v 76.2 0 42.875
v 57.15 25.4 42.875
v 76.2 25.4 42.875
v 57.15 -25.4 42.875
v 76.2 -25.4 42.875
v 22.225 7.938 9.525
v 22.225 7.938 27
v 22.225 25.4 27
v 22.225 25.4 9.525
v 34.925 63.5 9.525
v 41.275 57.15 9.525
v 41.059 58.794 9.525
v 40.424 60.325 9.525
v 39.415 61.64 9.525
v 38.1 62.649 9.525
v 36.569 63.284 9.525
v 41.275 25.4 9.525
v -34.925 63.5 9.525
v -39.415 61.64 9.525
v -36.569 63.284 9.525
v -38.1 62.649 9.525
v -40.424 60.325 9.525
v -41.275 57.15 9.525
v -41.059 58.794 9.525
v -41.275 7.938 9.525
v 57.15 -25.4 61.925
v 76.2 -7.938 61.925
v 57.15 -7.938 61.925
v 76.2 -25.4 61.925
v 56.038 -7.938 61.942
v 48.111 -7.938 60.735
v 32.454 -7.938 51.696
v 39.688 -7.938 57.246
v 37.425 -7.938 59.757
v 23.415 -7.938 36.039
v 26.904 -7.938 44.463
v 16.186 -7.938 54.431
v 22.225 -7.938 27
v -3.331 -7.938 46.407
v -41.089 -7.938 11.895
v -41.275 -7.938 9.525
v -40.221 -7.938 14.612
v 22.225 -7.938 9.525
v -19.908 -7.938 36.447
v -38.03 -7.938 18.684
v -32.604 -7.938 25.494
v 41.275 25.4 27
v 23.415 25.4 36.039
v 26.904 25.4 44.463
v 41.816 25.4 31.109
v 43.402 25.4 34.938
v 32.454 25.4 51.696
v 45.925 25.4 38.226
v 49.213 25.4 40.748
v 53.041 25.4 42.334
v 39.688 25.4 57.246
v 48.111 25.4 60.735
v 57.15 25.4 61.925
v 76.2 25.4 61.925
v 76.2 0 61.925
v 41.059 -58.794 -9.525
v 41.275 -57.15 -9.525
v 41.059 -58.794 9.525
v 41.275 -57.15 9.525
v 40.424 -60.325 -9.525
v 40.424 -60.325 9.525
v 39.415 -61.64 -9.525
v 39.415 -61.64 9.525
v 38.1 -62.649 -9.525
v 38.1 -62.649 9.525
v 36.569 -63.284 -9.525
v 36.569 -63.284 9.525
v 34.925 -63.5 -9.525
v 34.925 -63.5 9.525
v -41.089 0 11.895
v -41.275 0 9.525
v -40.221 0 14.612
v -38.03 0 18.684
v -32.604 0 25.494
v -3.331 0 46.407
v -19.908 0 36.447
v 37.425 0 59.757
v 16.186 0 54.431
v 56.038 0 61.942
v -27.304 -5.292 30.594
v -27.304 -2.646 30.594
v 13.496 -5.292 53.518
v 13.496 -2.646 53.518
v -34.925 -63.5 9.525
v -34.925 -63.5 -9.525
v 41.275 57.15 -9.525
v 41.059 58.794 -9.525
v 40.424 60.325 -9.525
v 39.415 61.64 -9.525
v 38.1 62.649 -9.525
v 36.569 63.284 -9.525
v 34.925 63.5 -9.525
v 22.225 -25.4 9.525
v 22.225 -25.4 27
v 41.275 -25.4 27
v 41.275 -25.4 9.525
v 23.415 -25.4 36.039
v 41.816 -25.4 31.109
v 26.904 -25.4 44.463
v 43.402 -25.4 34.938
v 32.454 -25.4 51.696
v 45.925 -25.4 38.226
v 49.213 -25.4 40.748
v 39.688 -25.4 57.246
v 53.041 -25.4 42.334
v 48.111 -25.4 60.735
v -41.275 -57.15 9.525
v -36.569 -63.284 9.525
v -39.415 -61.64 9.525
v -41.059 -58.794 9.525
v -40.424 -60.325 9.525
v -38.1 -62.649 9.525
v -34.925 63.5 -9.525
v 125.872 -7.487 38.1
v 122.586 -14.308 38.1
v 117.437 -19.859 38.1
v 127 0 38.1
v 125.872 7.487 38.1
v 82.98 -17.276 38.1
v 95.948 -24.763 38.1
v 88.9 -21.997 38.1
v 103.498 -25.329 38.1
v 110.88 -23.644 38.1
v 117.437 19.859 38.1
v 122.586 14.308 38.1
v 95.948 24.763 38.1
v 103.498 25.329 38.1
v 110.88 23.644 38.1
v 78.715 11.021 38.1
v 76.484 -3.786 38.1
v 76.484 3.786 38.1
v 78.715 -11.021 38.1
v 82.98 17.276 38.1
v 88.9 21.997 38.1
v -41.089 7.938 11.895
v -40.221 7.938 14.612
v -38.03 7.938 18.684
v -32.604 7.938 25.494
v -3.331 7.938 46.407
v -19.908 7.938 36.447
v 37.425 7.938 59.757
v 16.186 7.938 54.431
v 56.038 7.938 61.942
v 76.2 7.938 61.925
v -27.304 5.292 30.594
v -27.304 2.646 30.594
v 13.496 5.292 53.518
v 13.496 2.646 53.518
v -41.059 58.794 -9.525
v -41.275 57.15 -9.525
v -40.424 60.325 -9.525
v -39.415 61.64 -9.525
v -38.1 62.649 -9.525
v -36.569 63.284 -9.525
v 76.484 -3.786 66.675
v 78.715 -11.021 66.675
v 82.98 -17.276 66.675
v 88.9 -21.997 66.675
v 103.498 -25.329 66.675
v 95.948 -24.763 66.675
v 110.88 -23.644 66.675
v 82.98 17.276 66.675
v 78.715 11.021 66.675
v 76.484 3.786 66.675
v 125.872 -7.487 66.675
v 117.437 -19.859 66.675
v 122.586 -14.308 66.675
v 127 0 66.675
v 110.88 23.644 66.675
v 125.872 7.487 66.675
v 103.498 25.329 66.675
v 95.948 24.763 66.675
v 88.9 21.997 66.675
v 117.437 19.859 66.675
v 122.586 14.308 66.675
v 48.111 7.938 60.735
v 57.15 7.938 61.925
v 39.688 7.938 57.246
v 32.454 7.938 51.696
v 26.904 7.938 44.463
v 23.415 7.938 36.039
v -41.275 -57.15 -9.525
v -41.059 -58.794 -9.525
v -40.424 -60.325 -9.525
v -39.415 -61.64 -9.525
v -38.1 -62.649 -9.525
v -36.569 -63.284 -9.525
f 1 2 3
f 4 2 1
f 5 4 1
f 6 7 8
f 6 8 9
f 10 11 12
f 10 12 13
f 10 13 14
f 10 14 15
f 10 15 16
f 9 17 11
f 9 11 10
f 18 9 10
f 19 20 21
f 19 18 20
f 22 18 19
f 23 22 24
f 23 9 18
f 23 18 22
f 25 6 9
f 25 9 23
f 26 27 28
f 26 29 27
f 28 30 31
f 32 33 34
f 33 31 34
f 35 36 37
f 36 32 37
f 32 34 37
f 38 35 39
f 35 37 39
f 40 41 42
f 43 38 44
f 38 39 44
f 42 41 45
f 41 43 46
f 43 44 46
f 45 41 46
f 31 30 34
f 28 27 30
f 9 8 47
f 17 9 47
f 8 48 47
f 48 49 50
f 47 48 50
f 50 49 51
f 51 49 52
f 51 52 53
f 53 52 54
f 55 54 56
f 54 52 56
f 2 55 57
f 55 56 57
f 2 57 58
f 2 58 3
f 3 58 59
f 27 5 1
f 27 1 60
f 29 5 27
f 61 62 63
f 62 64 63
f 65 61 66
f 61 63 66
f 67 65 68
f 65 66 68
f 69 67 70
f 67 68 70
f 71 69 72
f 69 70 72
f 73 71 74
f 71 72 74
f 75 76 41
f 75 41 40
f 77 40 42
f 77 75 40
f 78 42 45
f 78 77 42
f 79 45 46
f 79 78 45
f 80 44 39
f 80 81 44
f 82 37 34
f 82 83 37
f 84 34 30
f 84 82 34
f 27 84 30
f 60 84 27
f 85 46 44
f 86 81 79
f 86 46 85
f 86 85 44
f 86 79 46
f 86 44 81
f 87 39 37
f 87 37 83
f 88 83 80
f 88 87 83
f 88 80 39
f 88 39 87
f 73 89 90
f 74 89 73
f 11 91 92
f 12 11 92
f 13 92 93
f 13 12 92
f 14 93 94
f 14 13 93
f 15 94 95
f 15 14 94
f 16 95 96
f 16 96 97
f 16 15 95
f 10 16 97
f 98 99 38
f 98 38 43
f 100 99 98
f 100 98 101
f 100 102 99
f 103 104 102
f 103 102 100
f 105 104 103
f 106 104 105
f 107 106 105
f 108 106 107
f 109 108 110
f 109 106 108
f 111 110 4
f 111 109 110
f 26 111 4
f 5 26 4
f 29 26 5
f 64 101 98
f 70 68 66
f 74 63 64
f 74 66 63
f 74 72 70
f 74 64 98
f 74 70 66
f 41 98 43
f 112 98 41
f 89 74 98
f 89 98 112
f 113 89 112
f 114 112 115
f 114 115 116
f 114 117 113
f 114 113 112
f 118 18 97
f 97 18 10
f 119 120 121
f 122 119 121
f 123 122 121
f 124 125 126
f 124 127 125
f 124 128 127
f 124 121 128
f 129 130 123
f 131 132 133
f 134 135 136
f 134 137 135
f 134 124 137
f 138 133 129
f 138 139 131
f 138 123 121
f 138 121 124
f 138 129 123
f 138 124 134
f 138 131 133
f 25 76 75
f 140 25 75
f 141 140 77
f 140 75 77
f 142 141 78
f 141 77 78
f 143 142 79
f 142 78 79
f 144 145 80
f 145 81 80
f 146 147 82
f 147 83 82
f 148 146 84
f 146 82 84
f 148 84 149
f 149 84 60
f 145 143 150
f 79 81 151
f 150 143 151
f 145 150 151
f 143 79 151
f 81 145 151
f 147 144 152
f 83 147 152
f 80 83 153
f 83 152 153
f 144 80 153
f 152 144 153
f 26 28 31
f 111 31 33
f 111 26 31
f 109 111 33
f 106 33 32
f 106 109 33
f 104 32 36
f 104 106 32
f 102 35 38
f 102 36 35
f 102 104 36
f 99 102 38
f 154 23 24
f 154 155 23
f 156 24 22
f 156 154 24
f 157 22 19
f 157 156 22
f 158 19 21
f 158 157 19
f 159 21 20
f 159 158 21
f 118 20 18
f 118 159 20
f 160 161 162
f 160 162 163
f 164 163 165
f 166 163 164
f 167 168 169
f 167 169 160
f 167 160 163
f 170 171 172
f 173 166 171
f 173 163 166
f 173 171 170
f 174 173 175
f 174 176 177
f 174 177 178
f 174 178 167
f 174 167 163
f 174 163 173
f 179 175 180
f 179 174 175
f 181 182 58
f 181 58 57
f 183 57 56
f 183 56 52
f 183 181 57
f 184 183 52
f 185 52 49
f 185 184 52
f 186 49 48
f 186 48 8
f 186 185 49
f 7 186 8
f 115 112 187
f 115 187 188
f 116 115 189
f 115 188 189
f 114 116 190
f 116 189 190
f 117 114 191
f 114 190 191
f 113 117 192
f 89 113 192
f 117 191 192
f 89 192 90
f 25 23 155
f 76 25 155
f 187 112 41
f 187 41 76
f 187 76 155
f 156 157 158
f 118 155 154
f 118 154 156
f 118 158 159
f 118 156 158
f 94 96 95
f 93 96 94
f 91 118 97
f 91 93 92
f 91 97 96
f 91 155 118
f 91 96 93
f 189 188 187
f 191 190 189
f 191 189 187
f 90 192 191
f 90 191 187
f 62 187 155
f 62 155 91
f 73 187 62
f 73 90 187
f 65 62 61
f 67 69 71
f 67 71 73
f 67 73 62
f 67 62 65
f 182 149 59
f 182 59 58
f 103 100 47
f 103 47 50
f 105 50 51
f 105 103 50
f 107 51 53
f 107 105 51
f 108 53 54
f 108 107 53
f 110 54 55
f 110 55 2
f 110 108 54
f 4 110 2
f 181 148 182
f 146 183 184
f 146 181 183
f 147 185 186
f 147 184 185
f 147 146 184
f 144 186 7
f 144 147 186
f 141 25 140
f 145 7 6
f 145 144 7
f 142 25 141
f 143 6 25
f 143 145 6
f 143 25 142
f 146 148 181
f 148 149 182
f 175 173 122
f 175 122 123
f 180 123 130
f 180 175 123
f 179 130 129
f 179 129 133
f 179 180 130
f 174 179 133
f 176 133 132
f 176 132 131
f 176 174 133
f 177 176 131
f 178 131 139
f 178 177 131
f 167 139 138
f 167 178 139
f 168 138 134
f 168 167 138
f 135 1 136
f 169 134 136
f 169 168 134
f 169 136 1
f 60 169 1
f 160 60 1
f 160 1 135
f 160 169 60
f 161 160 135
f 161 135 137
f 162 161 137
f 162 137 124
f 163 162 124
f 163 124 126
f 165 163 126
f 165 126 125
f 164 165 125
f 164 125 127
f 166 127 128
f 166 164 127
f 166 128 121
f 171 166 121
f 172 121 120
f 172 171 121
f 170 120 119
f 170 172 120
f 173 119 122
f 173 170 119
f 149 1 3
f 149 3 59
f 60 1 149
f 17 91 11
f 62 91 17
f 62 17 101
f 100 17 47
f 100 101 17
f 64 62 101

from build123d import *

# Parameters (mm, degrees)
F1_DEPTH = 63.5
F2_DEPTH = 25.4
F3_DEPTH = 7.9375
F5_R     = 6.35


with BuildPart() as f1:
    # F0 (on Front) → F1 (new body, symmetric)
    with BuildSketch(Plane.XZ):
        Polygon((22.225, 9.525), (-41.275, 9.525), (-41.275, -9.525), (41.275, -9.525), (41.275, 9.525), align=None)
    extrude(amount=F1_DEPTH, both=True)

    # F0 (on Front) → F2 (join, symmetric)
    with BuildSketch(Plane.XZ):
        with BuildLine():
            Line((22.225, 27.0002), (22.225, 9.525))
            Line((22.225, 9.525), (41.275, 9.525))
            Line((41.275, 9.525), (41.275, 27.0002))
            ThreePointArc((41.275, 27.0002), (45.92468, 38.22552), (57.15, 42.8752))
            Line((57.15, 42.8752), (76.2, 42.8752))
            Line((76.2, 42.8752), (76.2, 61.9252))
            Line((76.2, 61.9252), (57.15, 61.9252))
            ThreePointArc((57.15, 61.9252), (32.454296, 51.695904), (22.225, 27.0002))
        make_face()
    extrude(amount=F2_DEPTH, both=True)

    # F0 (on Front) → F3 (join, symmetric)
    with BuildSketch(Plane.XZ):
        with BuildLine():
            add(Edge.make_bspline(
                [(-41.275, 9.525), (-42.360839, 24.209788), (4.186844, 66.234112), (76.2, 61.9252)],
                knots=[0, 0, 0, 0, 128.631865, 128.631865, 128.631865, 128.631865], degree=3))
            Line((-41.275, 9.525), (22.225, 9.525))
            Line((22.225, 9.525), (22.225, 27.0002))
            ThreePointArc((22.225, 27.0002), (32.454296, 51.695904), (57.15, 61.9252))
            Line((57.15, 61.9252), (76.2, 61.9252))
        make_face()
    extrude(amount=F3_DEPTH, both=True)

    # F0 (on Front) → F4 (revolve)
    with BuildSketch(Plane.XZ):
        Polygon((101.6, 66.675), (101.6, 61.9252), (101.6, 42.8752), (101.6, 38.1), (127, 38.1), (127, 66.675), align=None)
    revolve(axis=Axis((101.6, 0, 52.3875), (0, 0, 1)))

    # F5
    f5_edges = [f1.edges().sort_by_distance(p)[0] for p in [
        (41.275, -63.5, 0),
        (-41.275, -63.5, 0),
        (-41.275, 63.5, 0),
        (41.275, 63.5, 0),
    ]]
    fillet(f5_edges, radius=F5_R)


solid = f1.part
